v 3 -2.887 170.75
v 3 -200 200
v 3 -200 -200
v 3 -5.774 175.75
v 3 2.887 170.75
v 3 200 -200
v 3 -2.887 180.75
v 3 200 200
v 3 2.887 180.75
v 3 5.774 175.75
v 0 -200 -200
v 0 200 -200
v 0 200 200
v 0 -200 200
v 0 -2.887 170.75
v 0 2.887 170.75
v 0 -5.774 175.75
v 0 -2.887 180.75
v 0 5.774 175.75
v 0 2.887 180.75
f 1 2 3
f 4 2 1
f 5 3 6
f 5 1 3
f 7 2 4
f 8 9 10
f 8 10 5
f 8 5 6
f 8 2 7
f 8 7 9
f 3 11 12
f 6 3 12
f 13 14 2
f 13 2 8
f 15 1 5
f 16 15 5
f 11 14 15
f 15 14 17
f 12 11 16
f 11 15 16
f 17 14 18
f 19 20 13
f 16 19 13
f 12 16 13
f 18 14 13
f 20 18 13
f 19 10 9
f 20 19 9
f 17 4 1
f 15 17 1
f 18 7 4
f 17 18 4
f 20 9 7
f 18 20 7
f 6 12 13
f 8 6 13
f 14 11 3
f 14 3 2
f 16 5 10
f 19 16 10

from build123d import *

# Parameters (mm, degrees)
F0_W     = 400
F0_H     = 400
F1_DEPTH = 3
F3_DEPTH = 25


with BuildPart() as f1:
    # F0 (on Right) → F1 (new body)
    with BuildSketch(Plane.YZ):
        Rectangle(F0_W, F0_H)
    extrude(amount=F1_DEPTH)

    # F2 (on face) → F3 (cut)
    with BuildSketch(Plane.YZ.offset(3)):
        Polygon((2.886751, 180.75), (-2.886751, 180.75), (-5.773503, 175.75), (-2.886751, 170.75), (2.886751, 170.75), (5.773503, 175.75), align=None)
    extrude(amount=-F3_DEPTH, mode=Mode.SUBTRACT)


solid = f1.part
